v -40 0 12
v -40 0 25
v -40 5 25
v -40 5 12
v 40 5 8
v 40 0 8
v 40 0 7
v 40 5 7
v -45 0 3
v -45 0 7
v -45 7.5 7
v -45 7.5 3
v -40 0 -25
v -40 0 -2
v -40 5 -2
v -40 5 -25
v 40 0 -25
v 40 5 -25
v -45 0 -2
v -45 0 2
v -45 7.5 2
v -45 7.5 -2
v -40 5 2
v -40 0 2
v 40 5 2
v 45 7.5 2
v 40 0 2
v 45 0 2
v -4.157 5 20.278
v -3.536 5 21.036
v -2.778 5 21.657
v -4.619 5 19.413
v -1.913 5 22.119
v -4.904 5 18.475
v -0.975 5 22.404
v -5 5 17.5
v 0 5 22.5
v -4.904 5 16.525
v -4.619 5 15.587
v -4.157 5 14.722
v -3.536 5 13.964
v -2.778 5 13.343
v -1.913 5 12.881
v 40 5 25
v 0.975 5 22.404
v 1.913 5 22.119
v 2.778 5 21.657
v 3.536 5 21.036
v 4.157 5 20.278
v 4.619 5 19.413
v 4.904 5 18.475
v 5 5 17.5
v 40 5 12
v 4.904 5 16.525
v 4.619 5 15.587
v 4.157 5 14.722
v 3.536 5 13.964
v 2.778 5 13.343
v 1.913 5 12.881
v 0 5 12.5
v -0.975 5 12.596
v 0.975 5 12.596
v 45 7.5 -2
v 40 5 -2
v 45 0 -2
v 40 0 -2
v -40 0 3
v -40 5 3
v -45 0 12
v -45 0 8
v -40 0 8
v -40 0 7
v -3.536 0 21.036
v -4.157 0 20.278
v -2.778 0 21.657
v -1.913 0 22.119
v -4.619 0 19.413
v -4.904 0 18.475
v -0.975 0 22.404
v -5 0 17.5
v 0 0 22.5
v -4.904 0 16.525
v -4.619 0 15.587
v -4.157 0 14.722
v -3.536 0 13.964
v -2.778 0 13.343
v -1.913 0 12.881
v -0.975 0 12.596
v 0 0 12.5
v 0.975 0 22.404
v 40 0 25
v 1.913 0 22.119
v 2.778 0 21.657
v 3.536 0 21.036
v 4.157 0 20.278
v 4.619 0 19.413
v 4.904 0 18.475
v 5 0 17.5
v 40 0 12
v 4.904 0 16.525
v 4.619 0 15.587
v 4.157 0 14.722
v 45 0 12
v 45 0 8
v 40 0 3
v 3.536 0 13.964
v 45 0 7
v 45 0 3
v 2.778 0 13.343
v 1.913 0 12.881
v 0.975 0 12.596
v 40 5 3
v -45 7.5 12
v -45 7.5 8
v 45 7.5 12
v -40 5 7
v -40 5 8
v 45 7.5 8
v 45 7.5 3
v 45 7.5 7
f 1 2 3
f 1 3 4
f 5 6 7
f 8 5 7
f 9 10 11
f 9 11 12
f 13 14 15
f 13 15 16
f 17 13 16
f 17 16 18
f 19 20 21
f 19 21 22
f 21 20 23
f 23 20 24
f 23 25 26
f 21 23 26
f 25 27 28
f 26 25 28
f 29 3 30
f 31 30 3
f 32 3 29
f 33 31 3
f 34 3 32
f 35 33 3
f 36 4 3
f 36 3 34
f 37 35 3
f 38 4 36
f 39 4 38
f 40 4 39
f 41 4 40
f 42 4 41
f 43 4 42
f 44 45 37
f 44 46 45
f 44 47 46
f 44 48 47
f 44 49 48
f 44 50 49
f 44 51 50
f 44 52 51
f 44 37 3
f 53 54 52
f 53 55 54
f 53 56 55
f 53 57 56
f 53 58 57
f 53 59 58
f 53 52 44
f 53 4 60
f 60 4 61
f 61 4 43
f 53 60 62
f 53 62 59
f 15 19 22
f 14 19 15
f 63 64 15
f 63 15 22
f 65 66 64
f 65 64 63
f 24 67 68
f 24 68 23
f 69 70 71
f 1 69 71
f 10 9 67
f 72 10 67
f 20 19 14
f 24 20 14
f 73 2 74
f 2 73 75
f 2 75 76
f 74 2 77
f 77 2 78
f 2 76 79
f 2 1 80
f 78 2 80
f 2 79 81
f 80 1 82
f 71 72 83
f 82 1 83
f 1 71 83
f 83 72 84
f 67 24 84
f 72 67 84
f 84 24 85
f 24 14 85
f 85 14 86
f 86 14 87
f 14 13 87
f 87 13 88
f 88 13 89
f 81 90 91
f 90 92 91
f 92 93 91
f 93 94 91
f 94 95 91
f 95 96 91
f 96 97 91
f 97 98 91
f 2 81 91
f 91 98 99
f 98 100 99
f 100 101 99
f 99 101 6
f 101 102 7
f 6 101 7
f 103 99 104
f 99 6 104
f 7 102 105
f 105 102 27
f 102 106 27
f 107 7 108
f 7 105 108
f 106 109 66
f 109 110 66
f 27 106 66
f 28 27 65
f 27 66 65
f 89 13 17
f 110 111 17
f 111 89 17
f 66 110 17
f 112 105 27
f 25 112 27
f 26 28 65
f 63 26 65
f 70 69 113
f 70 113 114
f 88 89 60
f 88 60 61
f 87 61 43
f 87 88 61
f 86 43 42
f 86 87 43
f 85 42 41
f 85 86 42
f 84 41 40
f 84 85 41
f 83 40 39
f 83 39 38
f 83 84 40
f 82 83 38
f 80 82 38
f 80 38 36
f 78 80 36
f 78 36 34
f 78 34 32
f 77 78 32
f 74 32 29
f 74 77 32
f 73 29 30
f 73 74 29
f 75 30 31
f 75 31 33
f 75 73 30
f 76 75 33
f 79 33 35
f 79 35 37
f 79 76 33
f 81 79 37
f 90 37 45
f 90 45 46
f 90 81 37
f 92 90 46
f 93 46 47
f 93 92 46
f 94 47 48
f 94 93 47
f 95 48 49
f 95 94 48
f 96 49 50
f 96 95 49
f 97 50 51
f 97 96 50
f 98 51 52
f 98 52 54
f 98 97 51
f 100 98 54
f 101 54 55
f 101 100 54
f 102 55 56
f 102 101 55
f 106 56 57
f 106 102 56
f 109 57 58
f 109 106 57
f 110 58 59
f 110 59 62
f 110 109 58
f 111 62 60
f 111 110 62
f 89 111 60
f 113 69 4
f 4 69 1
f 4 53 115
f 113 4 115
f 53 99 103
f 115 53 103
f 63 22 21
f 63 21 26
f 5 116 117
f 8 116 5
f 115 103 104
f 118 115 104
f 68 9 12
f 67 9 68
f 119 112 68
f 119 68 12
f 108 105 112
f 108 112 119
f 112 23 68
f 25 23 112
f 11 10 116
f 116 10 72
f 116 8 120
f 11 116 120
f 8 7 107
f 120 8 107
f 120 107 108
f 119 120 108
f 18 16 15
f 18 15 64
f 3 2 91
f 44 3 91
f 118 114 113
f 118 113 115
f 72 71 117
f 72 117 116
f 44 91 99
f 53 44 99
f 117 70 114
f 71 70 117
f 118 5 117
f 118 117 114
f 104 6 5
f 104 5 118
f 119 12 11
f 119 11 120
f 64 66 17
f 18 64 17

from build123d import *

# Parameters (mm, degrees)
SKETCH1_W           = 80
SKETCH1_H           = 50
BOSS_EXTRUDE1_DEPTH = 5
SKETCH1_3_W         = 90
SKETCH1_3_H         = 4
BOSS_EXTRUDE2_DEPTH = 7.5
SKETCH1_4_R         = 5
CUT_EXTRUDE1_DEPTH  = 5


with BuildPart() as part:
    # Sketch1 → Boss-Extrude1 (new body)
    with BuildSketch(Plane(origin=(0, 0, 0), x_dir=(1, 0, 0), z_dir=(0, 1, 0))):
        Rectangle(SKETCH1_W, SKETCH1_H)
    extrude(amount=BOSS_EXTRUDE1_DEPTH)

    # Sketch1<3> → Boss-Extrude2 (add)
    with BuildSketch(Plane(origin=(0, 0, 0), x_dir=(1, 0, 0), z_dir=(0, 1, 0))):
        Rectangle(SKETCH1_3_W, SKETCH1_3_H)
        with Locations((0, -5)):
            Rectangle(SKETCH1_3_W, SKETCH1_3_H)
        with Locations((0, -10)):
            Rectangle(SKETCH1_3_W, SKETCH1_3_H)
    extrude(amount=BOSS_EXTRUDE2_DEPTH)

    # Sketch1<4> → Cut-Extrude1 (cut)
    with BuildSketch(Plane(origin=(0, 0, 0), x_dir=(1, 0, 0), z_dir=(0, 1, 0))):
        with Locations(Location((0, -17.5, 0), (0, 0, 90))):
            Circle(SKETCH1_4_R)
    extrude(amount=CUT_EXTRUDE1_DEPTH, mode=Mode.SUBTRACT)


solid = part.part
